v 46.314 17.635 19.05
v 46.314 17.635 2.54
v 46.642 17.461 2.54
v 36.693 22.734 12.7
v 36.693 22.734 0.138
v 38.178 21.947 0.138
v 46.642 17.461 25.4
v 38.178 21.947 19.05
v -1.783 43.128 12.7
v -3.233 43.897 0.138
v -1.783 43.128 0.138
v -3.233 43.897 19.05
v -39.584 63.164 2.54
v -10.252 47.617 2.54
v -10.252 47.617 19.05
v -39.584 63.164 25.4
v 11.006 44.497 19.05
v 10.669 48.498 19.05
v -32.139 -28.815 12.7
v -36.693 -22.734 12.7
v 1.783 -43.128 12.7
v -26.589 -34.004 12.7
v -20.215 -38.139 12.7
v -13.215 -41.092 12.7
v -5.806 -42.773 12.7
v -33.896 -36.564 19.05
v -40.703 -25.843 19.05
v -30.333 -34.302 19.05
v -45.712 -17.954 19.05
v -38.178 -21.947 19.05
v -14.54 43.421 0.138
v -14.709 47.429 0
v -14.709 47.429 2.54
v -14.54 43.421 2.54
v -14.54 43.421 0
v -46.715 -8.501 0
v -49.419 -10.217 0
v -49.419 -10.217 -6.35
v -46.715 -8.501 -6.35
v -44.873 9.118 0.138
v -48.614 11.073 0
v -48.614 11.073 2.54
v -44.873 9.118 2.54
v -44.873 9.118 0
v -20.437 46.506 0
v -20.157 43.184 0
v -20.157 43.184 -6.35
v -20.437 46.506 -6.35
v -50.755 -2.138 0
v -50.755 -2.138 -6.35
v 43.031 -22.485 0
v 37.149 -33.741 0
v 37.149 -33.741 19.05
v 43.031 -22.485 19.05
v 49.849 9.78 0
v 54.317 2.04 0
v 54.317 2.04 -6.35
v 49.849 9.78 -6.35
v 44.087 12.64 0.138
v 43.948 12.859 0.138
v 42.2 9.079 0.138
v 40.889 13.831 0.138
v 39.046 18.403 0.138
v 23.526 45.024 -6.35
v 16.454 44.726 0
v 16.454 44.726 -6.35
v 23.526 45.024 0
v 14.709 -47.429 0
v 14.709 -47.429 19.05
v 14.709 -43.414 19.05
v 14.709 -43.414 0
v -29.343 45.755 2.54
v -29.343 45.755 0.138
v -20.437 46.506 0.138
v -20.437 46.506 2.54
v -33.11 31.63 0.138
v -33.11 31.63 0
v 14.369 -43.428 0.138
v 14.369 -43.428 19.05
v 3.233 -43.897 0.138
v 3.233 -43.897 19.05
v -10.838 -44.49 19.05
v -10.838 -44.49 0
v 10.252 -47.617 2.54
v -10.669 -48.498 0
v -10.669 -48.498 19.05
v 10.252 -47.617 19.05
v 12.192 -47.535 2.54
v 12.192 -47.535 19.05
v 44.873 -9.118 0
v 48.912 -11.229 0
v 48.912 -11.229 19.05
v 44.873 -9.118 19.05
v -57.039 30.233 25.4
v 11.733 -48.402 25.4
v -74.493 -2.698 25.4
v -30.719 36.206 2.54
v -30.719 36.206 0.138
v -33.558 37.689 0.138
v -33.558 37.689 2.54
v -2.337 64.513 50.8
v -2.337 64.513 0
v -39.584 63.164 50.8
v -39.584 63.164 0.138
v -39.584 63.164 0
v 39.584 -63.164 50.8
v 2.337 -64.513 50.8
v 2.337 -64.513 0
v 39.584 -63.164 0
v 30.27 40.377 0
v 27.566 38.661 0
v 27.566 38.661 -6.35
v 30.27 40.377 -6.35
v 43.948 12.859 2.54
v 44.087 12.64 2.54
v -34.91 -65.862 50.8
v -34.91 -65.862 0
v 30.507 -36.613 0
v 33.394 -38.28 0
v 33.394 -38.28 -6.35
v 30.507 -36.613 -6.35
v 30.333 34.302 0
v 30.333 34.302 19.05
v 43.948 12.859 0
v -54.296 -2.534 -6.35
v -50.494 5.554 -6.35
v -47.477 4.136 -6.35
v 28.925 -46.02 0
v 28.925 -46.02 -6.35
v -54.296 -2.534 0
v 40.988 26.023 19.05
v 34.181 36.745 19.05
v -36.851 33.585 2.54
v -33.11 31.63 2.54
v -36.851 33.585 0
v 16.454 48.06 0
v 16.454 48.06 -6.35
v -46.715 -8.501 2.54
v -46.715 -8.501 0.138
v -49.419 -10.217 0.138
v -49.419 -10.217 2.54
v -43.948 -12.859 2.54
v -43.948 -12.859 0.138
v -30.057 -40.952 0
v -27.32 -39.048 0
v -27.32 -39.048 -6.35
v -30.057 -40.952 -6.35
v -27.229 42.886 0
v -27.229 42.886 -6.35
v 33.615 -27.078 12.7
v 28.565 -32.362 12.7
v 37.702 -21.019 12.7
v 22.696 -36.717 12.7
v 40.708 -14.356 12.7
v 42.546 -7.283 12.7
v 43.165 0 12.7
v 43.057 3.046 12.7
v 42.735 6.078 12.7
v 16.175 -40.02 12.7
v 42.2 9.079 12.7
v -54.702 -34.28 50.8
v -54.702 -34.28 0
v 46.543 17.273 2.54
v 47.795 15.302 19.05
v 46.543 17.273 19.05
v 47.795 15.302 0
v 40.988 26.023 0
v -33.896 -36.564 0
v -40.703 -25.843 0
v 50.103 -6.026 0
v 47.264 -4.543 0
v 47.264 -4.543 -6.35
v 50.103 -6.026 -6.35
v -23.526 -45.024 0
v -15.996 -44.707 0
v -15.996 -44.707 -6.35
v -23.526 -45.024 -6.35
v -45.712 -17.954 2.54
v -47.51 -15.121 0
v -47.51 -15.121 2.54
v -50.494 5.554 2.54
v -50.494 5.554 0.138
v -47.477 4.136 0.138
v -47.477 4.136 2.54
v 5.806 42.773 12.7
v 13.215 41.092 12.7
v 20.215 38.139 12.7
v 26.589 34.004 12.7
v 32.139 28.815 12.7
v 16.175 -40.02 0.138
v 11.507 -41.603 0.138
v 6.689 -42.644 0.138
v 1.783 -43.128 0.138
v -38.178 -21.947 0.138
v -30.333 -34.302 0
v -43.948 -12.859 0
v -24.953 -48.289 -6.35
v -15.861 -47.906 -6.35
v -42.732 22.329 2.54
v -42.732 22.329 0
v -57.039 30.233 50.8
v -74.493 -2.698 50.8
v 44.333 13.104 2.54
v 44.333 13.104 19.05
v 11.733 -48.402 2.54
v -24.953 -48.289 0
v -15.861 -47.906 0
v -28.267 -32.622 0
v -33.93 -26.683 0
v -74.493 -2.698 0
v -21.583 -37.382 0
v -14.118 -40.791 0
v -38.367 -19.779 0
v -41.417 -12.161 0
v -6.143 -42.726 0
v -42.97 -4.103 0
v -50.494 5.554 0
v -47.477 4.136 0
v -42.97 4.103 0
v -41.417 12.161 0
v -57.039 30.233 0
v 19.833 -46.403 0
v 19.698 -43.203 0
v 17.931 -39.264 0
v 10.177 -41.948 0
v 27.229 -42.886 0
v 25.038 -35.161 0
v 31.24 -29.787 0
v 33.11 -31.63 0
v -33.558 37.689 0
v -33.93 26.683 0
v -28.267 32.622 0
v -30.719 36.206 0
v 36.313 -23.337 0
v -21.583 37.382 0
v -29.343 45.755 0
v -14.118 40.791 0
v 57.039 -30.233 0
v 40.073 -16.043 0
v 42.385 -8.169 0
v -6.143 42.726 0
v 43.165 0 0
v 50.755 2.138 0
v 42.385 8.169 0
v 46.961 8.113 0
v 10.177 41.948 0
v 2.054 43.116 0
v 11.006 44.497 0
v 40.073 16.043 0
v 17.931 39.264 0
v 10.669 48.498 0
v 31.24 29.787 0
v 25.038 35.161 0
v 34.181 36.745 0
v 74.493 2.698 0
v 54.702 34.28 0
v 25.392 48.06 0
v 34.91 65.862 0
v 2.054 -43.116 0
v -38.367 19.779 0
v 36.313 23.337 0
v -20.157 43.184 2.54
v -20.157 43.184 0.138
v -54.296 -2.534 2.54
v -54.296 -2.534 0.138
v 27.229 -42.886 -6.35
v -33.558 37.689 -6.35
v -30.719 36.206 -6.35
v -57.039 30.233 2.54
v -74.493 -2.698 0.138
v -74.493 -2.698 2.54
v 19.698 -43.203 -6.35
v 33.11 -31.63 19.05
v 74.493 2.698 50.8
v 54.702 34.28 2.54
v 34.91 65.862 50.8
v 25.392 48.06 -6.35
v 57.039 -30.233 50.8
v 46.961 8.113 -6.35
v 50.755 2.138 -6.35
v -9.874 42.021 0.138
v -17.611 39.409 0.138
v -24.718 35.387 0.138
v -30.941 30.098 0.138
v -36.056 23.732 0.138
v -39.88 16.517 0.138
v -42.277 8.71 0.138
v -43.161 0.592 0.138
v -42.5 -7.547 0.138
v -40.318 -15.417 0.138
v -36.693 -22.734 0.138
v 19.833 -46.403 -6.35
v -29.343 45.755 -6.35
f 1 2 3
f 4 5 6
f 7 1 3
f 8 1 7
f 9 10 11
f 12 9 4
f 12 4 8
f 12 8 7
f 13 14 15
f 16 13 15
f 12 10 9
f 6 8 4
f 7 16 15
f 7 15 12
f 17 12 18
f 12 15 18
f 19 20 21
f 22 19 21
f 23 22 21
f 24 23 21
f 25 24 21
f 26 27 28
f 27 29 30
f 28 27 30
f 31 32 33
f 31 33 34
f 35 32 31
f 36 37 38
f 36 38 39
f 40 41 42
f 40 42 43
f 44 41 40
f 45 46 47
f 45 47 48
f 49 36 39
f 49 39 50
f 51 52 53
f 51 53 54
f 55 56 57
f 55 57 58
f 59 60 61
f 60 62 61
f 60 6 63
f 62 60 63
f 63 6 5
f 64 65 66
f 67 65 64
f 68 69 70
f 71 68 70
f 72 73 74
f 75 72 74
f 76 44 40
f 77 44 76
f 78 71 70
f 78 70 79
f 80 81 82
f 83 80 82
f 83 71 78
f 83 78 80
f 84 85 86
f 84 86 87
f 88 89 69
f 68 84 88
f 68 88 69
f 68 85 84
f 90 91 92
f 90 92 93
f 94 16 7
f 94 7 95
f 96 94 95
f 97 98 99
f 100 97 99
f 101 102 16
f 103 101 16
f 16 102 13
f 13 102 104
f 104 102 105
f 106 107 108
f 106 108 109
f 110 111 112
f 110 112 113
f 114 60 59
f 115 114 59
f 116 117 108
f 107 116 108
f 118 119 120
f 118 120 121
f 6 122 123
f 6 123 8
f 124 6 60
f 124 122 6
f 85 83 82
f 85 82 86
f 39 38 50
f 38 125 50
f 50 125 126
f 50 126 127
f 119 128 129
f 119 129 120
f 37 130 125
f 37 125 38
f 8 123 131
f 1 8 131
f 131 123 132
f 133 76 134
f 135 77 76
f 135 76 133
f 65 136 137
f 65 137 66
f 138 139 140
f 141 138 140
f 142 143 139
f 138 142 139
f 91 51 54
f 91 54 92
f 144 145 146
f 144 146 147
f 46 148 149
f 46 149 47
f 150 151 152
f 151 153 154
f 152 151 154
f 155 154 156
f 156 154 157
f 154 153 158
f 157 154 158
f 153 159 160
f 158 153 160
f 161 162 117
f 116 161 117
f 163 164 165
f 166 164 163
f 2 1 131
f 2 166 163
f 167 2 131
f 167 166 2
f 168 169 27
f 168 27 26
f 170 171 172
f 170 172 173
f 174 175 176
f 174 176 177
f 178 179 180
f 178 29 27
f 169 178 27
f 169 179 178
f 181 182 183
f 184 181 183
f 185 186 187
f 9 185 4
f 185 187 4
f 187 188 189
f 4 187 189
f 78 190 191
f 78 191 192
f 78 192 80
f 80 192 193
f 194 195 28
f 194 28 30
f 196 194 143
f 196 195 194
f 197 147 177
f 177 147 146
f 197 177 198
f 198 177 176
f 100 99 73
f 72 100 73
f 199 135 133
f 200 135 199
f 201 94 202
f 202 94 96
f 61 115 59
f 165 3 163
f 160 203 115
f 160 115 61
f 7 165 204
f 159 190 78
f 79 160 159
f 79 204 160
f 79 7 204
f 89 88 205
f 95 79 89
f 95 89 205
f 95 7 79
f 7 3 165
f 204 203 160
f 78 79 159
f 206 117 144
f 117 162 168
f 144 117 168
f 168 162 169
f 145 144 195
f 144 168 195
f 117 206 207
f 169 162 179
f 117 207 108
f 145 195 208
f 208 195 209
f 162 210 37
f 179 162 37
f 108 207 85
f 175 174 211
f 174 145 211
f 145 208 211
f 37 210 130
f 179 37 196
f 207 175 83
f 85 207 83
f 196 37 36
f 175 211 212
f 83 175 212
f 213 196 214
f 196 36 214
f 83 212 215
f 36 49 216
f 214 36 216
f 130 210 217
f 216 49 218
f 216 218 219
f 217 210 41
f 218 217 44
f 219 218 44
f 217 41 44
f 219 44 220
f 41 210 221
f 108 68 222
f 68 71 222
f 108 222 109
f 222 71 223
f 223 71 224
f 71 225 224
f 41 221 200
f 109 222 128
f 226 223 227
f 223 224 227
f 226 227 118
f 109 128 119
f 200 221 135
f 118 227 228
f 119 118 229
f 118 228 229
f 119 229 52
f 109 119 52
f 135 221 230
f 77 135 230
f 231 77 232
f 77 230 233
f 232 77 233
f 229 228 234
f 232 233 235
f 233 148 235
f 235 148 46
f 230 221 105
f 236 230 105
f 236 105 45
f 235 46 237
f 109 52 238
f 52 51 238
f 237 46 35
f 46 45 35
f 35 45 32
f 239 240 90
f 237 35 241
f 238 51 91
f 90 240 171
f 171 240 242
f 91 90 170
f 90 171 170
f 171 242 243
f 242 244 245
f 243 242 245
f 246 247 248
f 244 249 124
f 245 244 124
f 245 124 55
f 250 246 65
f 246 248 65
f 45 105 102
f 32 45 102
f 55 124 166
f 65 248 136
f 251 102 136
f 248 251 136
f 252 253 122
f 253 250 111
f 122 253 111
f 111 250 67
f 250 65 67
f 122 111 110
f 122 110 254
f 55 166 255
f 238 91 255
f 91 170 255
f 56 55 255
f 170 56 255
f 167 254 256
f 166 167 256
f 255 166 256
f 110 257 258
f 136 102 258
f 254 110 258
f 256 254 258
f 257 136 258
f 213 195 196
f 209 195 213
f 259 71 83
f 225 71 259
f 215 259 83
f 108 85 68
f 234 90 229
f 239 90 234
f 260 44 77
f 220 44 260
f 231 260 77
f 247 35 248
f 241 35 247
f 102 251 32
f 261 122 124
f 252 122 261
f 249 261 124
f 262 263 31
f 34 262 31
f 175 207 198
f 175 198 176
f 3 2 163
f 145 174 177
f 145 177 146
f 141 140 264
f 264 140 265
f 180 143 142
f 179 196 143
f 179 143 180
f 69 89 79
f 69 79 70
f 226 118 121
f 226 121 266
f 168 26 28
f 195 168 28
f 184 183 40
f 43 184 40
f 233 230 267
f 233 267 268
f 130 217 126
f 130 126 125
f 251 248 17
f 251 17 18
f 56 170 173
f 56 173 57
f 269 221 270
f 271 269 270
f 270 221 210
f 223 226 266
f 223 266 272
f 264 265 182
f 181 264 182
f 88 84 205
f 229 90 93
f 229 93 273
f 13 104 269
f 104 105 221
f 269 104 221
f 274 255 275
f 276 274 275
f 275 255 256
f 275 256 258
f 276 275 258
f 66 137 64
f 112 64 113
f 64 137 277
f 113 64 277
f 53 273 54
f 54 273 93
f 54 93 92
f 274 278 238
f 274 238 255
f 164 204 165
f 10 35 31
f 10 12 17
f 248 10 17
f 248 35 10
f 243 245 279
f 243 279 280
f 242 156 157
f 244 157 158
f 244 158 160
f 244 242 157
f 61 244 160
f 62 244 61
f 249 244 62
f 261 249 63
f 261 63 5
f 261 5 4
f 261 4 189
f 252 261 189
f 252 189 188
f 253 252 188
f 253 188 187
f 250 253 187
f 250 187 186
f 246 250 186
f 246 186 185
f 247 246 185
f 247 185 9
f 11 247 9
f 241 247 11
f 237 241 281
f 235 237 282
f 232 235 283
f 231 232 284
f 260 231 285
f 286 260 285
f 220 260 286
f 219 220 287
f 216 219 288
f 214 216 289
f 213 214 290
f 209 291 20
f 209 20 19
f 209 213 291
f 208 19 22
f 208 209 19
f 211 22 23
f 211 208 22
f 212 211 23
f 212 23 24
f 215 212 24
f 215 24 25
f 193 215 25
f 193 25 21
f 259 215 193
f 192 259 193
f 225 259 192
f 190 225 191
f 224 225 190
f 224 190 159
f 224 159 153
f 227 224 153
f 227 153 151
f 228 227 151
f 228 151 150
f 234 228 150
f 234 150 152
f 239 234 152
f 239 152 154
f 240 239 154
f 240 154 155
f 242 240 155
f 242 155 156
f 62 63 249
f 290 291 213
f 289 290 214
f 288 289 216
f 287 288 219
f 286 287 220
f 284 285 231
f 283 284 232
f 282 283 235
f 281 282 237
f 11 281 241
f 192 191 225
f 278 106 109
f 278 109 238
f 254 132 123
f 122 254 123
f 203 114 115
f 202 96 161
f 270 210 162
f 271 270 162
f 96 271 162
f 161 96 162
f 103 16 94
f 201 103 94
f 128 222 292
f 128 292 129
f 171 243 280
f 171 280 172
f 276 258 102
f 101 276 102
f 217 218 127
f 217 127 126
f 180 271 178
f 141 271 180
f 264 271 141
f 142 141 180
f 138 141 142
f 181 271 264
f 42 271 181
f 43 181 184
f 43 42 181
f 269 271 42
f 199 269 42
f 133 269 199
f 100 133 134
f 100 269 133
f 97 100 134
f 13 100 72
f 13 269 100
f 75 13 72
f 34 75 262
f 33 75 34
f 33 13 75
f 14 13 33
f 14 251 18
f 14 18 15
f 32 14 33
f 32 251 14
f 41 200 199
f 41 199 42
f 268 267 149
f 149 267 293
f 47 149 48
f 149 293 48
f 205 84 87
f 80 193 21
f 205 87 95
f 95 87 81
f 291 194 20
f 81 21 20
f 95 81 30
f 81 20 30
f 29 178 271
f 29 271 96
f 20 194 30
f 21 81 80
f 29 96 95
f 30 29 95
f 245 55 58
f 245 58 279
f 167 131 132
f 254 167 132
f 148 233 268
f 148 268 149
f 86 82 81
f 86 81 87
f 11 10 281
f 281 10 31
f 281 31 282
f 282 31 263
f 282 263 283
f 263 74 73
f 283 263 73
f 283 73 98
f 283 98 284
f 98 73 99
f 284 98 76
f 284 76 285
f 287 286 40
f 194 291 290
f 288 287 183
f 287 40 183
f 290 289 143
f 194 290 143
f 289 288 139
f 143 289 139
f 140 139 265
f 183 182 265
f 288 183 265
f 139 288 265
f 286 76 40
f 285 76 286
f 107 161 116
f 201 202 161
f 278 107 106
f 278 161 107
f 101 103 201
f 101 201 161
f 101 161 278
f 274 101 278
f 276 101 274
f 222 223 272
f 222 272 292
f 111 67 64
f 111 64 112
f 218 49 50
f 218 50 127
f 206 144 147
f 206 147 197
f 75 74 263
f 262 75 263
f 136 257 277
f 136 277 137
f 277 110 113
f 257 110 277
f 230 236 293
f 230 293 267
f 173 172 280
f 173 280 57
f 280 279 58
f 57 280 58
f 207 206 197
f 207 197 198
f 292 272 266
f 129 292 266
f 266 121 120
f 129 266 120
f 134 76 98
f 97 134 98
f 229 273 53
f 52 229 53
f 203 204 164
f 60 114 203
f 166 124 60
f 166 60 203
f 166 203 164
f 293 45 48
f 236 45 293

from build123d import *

# Parameters (mm, degrees)
F0_R     = 43.165050556
F1_DEPTH = 50.8
F2_DEPTH = 12.7
F3_W     = 74.5423375242
F3_H     = 25.2622670705
F5_DEPTH = 97.5896194577
F6_DEPTH = 19.05
F7_DEPTH = 19.05
F8_DEPTH = 2.54
F9_DEPTH = 6.35


with BuildPart() as f1:
    # F0 (on Top) → F1 (new body)
    with BuildSketch(Plane.XY):
        with BuildLine():
            Line((57.0385901099, -30.2327521232), (74.4934776686, 2.6984937288))
            Line((74.4934776686, 2.6984937288), (54.7016252051, 34.2804939083))
            ThreePointArc((54.7016252051, 34.2804939083), (62.0431865669, 17.8343226196), (64.5555579534, 0))
            ThreePointArc((64.5555579534, 0), (62.6481367325, -15.5766179457), (57.0385901099, -30.2327521232))
        make_face()
        with BuildLine():
            Line((39.5837029554, -63.1639972128), (57.0385901099, -30.2327521232))
            ThreePointArc((57.0385901099, -30.2327521232), (34.280492356, -54.7016261779), (2.3369646013, -64.5132440599))
            Line((2.3369646013, -64.5132440599), (39.5837029554, -63.1639972128))
        make_face()
        with BuildLine():
            Line((-34.9097747132, -65.8624909417), (2.3369646013, -64.5132440599))
            ThreePointArc((2.3369646013, -64.5132440599), (-30.2327516987, -57.038590335), (-54.7016263939, -34.2804920112))
            Line((-54.7016263939, -34.2804920112), (-34.9097747132, -65.8624909417))
        make_face()
        with BuildLine():
            Line((-74.4934776686, -2.6984937288), (-54.7016263939, -34.2804920112))
            ThreePointArc((-54.7016263939, -34.2804920112), (-64.5132440984, -2.3369635366), (-57.0385899433, 30.2327524377))
            Line((-57.0385899433, 30.2327524377), (-74.4934776686, -2.6984937288))
        make_face()
        with BuildLine():
            ThreePointArc((2.3369646013, -64.5132440599), (34.280492356, -54.7016261779), (57.0385901099, -30.2327521232))
            ThreePointArc((57.0385901099, -30.2327521232), (62.6481367325, -15.5766179457), (64.5555579534, 0))
            ThreePointArc((64.5555579534, 0), (62.0431865669, 17.8343226196), (54.7016252051, 34.2804939083))
            ThreePointArc((54.7016252051, 34.2804939083), (30.232750983, 57.0385907143), (-2.3369639827, 64.5132440823))
            ThreePointArc((-2.3369639827, 64.5132440823), (-34.280491943, 54.7016264367), (-57.0385899433, 30.2327524377))
            ThreePointArc((-57.0385899433, 30.2327524377), (-64.5132440984, -2.3369635366), (-54.7016263939, -34.2804920112))
            ThreePointArc((-54.7016263939, -34.2804920112), (-30.2327516987, -57.038590335), (2.3369646013, -64.5132440599))
        make_face()
        Circle(F0_R, mode=Mode.SUBTRACT)
        with BuildLine():
            ThreePointArc((-57.0385899433, 30.2327524377), (-34.280491943, 54.7016264367), (-2.3369639827, 64.5132440823))
            Line((-2.3369639827, 64.5132440823), (-39.5837029554, 63.1639972128))
            Line((-39.5837029554, 63.1639972128), (-57.0385899433, 30.2327524377))
        make_face()
        with BuildLine():
            ThreePointArc((-2.3369639827, 64.5132440823), (30.232750983, 57.0385907143), (54.7016252051, 34.2804939083))
            Line((54.7016252051, 34.2804939083), (34.9097747132, 65.8624909417))
            Line((34.9097747132, 65.8624909417), (-2.3369639827, 64.5132440823))
        make_face()
        Circle(F0_R)
    extrude(amount=F1_DEPTH)

    # F0 (on Top) → F2 (cut)
    with BuildSketch(Plane.XY):
        Circle(F0_R)
    extrude(amount=F2_DEPTH, mode=Mode.SUBTRACT)

    # F3 (on face) → F5 (cut)
    with BuildSketch(Plane(origin=(-57.038590312, 30.232751742, 0), x_dir=(-0.4683214382, -0.8835581648, 0), z_dir=(-0.8835581648, 0.4683214382, 0))):
        with Locations((0, 12.7688664648)):
            Rectangle(F3_W, F3_H)
    extrude(amount=-F5_DEPTH, mode=Mode.SUBTRACT)

    # F4 (on face) → F6 (cut)
    with BuildSketch(Plane.XY):
        Polygon((14.7088014101, -43.41361173), (-10.8375270656, -44.4895269373), (-10.6687015415, -48.4980884536), (2.0200499343, -47.9636859978), (14.7088014101, -47.429283542), align=None)
        Polygon((30.3334603819, 34.3023495006), (43.9478240628, 12.8591897156), (47.7949766962, 15.3017651388), (40.9877948558, 26.0233450313), (34.1806130153, 36.7449249238), align=None)
        Polygon((44.8734362679, -9.1183725252), (33.1102969972, -31.6303372217), (37.1492056811, -33.7407814228), (43.0307753164, -22.4847990746), (48.9123449518, -11.2288167263), align=None)
    extrude(amount=F6_DEPTH, mode=Mode.SUBTRACT)

    # F4 (on face) → F7 (cut)
    with BuildSketch(Plane.XY):
        Polygon((-33.8961248298, -36.5643020277), (-30.3334603819, -34.3023495006), (-43.9478240628, -12.8591897156), (-47.5104885107, -15.1211422428), (-40.7033066702, -25.8427221352), align=None)
        Polygon((-48.6136768425, 11.0727541786), (-44.8734362679, 9.1183725252), (-33.1102969972, 31.6303372217), (-36.8505375718, 33.5847188751), (-42.7321072072, 22.3287365268), align=None)
        Polygon((-14.7088014101, 47.429283542), (-14.539975886, 43.4207220257), (11.0063525898, 44.4966372329), (10.6687015415, 48.4980884536), (-2.0200499343, 47.9636859978), align=None)
    extrude(amount=F7_DEPTH, mode=Mode.SUBTRACT)

    # F0 (on Top) + F4 (on face) → F8 (join)
    with BuildSketch(Plane.XY):
        with BuildLine():
            ThreePointArc((-57.0385899433, 30.2327524377), (-34.280491943, 54.7016264367), (-2.3369639827, 64.5132440823))
            Line((-2.3369639827, 64.5132440823), (-39.5837029554, 63.1639972128))
            Line((-39.5837029554, 63.1639972128), (-57.0385899433, 30.2327524377))
        make_face()
        with BuildLine():
            Line((-74.4934776686, -2.6984937288), (-54.7016263939, -34.2804920112))
            ThreePointArc((-54.7016263939, -34.2804920112), (-64.5132440984, -2.3369635366), (-57.0385899433, 30.2327524377))
            Line((-57.0385899433, 30.2327524377), (-74.4934776686, -2.6984937288))
        make_face()
    with BuildSketch(Plane.XY):
        with BuildLine():
            ThreePointArc((-54.7016263939, -34.2804920112), (-30.2327516987, -57.038590335), (2.3369646013, -64.5132440599))
            ThreePointArc((2.3369646013, -64.5132440599), (34.280492356, -54.7016261779), (57.0385901099, -30.2327521232))
            ThreePointArc((57.0385901099, -30.2327521232), (62.6481367325, -15.5766179457), (64.5555579534, 0))
            ThreePointArc((64.5555579534, 0), (62.0431865669, 17.8343226196), (54.7016252051, 34.2804939083))
            ThreePointArc((54.7016252051, 34.2804939083), (30.232750983, 57.0385907143), (-2.3369639827, 64.5132440823))
            ThreePointArc((-2.3369639827, 64.5132440823), (-34.280491943, 54.7016264367), (-57.0385899433, 30.2327524377))
            ThreePointArc((-57.0385899433, 30.2327524377), (-64.5132440984, -2.3369635366), (-54.7016263939, -34.2804920112))
        make_face()
        Polygon((-30.0572673127, -40.9522618745), (-27.3202242883, -39.0483151983), (-30.3334603819, -34.3023495006), (-33.8961248298, -36.5643020277), (-40.7033066702, -25.8427221352), (-47.5104885107, -15.1211422428), (-43.9478240628, -12.8591897156), (-46.7150717143, -8.5006655168), (-49.4185883118, -10.2171410057), (-54.2964744699, -2.5342779097), (-50.4943327821, 5.5542261239), (-47.4769450808, 4.1358506716), (-44.8734362679, 9.1183725252), (-48.6136768425, 11.0727541786), (-42.7321072072, 22.3287365268), (-36.8505375718, 33.5847188751), (-33.1102969972, 31.6303372217), (-30.7193281438, 36.2061060858), (-33.5575978209, 37.6891823943), (-29.342986285, 45.754987272), (-20.4370654694, 46.5064879984), (-20.1567207926, 43.1841658699), (-14.539975886, 43.4207220257), (-14.7088014101, 47.429283542), (-2.0200499343, 47.9636859978), (10.6687015415, 48.4980884536), (11.0063525898, 44.4966372329), (16.4542719722, 44.7260830931), (16.4542719722, 48.0602122843), (25.3918431699, 48.0602122843), (30.269729328, 40.3773491883), (27.5662127305, 38.6608736994), (30.3334603819, 34.3023495006), (34.1806130153, 36.7449249238), (40.9877948558, 26.0233450313), (47.7949766962, 15.3017651388), (43.9478240628, 12.8591897156), (46.9610601565, 8.1132240179), (49.8485007356, 9.7802886135), (54.3172863345, 2.0401249081), (50.1026747985, -6.0256799696), (47.2644051214, -4.542603661), (44.8734362679, -9.1183725252), (48.9123449518, -11.2288167263), (43.0307753164, -22.4847990746), (37.1492056811, -33.7407814228), (33.1102969972, -31.6303372217), (30.5067881843, -36.6128590752), (33.3942287634, -38.2799236708), (28.9254431645, -46.0200873762), (19.8329454705, -46.4030291579), (19.6981923909, -43.2034773604), (14.7088014101, -43.41361173), (14.7088014101, -47.429283542), (2.0200499343, -47.9636859978), (-10.6687015415, -48.4980884536), (-10.8375270656, -44.4895269373), (-15.9957435705, -44.7067716026), (-15.8609904909, -47.9063234), (-24.9534881849, -48.2892651817), align=None, mode=Mode.SUBTRACT)
    extrude(amount=F8_DEPTH)

    # F4 (on face) → F9 (join)
    with BuildSketch(Plane.XY):
        Polygon((27.2287273618, -42.8863195699), (19.6981923909, -43.2034773604), (19.8329454705, -46.4030291579), (28.9254431645, -46.0200873762), (33.3942287634, -38.2799236708), (30.5067881843, -36.6128590752), align=None)
        Polygon((-15.9957435705, -44.7067716026), (-23.5262785415, -45.023929393), (-27.3202242883, -39.0483151983), (-30.0572673127, -40.9522618745), (-24.9534881849, -48.2892651817), (-15.8609904909, -47.9063234), align=None)
        Polygon((-49.4185883118, -10.2171410057), (-46.7150717143, -8.5006655168), (-50.7550059033, -2.1376098231), (-47.4769450808, 4.1358506716), (-50.4943327821, 5.5542261239), (-54.2964744699, -2.5342779097), align=None)
        Polygon((-33.5575978209, 37.6891823943), (-30.7193281438, 36.2061060858), (-27.2287273618, 42.8863195699), (-20.1567207926, 43.1841658699), (-20.4370654694, 46.5064879984), (-29.342986285, 45.754987272), align=None)
        Polygon((16.4542719722, 48.0602122843), (16.4542719722, 44.7260830931), (23.5262785415, 45.023929393), (27.5662127305, 38.6608736994), (30.269729328, 40.3773491883), (25.3918431699, 48.0602122843), align=None)
        Polygon((50.7550059033, 2.1376098231), (47.2644051214, -4.542603661), (50.1026747985, -6.0256799696), (54.3172863345, 2.0401249081), (49.8485007356, 9.7802886135), (46.9610601565, 8.1132240179), align=None)
    extrude(amount=-F9_DEPTH)


solid = f1.part
